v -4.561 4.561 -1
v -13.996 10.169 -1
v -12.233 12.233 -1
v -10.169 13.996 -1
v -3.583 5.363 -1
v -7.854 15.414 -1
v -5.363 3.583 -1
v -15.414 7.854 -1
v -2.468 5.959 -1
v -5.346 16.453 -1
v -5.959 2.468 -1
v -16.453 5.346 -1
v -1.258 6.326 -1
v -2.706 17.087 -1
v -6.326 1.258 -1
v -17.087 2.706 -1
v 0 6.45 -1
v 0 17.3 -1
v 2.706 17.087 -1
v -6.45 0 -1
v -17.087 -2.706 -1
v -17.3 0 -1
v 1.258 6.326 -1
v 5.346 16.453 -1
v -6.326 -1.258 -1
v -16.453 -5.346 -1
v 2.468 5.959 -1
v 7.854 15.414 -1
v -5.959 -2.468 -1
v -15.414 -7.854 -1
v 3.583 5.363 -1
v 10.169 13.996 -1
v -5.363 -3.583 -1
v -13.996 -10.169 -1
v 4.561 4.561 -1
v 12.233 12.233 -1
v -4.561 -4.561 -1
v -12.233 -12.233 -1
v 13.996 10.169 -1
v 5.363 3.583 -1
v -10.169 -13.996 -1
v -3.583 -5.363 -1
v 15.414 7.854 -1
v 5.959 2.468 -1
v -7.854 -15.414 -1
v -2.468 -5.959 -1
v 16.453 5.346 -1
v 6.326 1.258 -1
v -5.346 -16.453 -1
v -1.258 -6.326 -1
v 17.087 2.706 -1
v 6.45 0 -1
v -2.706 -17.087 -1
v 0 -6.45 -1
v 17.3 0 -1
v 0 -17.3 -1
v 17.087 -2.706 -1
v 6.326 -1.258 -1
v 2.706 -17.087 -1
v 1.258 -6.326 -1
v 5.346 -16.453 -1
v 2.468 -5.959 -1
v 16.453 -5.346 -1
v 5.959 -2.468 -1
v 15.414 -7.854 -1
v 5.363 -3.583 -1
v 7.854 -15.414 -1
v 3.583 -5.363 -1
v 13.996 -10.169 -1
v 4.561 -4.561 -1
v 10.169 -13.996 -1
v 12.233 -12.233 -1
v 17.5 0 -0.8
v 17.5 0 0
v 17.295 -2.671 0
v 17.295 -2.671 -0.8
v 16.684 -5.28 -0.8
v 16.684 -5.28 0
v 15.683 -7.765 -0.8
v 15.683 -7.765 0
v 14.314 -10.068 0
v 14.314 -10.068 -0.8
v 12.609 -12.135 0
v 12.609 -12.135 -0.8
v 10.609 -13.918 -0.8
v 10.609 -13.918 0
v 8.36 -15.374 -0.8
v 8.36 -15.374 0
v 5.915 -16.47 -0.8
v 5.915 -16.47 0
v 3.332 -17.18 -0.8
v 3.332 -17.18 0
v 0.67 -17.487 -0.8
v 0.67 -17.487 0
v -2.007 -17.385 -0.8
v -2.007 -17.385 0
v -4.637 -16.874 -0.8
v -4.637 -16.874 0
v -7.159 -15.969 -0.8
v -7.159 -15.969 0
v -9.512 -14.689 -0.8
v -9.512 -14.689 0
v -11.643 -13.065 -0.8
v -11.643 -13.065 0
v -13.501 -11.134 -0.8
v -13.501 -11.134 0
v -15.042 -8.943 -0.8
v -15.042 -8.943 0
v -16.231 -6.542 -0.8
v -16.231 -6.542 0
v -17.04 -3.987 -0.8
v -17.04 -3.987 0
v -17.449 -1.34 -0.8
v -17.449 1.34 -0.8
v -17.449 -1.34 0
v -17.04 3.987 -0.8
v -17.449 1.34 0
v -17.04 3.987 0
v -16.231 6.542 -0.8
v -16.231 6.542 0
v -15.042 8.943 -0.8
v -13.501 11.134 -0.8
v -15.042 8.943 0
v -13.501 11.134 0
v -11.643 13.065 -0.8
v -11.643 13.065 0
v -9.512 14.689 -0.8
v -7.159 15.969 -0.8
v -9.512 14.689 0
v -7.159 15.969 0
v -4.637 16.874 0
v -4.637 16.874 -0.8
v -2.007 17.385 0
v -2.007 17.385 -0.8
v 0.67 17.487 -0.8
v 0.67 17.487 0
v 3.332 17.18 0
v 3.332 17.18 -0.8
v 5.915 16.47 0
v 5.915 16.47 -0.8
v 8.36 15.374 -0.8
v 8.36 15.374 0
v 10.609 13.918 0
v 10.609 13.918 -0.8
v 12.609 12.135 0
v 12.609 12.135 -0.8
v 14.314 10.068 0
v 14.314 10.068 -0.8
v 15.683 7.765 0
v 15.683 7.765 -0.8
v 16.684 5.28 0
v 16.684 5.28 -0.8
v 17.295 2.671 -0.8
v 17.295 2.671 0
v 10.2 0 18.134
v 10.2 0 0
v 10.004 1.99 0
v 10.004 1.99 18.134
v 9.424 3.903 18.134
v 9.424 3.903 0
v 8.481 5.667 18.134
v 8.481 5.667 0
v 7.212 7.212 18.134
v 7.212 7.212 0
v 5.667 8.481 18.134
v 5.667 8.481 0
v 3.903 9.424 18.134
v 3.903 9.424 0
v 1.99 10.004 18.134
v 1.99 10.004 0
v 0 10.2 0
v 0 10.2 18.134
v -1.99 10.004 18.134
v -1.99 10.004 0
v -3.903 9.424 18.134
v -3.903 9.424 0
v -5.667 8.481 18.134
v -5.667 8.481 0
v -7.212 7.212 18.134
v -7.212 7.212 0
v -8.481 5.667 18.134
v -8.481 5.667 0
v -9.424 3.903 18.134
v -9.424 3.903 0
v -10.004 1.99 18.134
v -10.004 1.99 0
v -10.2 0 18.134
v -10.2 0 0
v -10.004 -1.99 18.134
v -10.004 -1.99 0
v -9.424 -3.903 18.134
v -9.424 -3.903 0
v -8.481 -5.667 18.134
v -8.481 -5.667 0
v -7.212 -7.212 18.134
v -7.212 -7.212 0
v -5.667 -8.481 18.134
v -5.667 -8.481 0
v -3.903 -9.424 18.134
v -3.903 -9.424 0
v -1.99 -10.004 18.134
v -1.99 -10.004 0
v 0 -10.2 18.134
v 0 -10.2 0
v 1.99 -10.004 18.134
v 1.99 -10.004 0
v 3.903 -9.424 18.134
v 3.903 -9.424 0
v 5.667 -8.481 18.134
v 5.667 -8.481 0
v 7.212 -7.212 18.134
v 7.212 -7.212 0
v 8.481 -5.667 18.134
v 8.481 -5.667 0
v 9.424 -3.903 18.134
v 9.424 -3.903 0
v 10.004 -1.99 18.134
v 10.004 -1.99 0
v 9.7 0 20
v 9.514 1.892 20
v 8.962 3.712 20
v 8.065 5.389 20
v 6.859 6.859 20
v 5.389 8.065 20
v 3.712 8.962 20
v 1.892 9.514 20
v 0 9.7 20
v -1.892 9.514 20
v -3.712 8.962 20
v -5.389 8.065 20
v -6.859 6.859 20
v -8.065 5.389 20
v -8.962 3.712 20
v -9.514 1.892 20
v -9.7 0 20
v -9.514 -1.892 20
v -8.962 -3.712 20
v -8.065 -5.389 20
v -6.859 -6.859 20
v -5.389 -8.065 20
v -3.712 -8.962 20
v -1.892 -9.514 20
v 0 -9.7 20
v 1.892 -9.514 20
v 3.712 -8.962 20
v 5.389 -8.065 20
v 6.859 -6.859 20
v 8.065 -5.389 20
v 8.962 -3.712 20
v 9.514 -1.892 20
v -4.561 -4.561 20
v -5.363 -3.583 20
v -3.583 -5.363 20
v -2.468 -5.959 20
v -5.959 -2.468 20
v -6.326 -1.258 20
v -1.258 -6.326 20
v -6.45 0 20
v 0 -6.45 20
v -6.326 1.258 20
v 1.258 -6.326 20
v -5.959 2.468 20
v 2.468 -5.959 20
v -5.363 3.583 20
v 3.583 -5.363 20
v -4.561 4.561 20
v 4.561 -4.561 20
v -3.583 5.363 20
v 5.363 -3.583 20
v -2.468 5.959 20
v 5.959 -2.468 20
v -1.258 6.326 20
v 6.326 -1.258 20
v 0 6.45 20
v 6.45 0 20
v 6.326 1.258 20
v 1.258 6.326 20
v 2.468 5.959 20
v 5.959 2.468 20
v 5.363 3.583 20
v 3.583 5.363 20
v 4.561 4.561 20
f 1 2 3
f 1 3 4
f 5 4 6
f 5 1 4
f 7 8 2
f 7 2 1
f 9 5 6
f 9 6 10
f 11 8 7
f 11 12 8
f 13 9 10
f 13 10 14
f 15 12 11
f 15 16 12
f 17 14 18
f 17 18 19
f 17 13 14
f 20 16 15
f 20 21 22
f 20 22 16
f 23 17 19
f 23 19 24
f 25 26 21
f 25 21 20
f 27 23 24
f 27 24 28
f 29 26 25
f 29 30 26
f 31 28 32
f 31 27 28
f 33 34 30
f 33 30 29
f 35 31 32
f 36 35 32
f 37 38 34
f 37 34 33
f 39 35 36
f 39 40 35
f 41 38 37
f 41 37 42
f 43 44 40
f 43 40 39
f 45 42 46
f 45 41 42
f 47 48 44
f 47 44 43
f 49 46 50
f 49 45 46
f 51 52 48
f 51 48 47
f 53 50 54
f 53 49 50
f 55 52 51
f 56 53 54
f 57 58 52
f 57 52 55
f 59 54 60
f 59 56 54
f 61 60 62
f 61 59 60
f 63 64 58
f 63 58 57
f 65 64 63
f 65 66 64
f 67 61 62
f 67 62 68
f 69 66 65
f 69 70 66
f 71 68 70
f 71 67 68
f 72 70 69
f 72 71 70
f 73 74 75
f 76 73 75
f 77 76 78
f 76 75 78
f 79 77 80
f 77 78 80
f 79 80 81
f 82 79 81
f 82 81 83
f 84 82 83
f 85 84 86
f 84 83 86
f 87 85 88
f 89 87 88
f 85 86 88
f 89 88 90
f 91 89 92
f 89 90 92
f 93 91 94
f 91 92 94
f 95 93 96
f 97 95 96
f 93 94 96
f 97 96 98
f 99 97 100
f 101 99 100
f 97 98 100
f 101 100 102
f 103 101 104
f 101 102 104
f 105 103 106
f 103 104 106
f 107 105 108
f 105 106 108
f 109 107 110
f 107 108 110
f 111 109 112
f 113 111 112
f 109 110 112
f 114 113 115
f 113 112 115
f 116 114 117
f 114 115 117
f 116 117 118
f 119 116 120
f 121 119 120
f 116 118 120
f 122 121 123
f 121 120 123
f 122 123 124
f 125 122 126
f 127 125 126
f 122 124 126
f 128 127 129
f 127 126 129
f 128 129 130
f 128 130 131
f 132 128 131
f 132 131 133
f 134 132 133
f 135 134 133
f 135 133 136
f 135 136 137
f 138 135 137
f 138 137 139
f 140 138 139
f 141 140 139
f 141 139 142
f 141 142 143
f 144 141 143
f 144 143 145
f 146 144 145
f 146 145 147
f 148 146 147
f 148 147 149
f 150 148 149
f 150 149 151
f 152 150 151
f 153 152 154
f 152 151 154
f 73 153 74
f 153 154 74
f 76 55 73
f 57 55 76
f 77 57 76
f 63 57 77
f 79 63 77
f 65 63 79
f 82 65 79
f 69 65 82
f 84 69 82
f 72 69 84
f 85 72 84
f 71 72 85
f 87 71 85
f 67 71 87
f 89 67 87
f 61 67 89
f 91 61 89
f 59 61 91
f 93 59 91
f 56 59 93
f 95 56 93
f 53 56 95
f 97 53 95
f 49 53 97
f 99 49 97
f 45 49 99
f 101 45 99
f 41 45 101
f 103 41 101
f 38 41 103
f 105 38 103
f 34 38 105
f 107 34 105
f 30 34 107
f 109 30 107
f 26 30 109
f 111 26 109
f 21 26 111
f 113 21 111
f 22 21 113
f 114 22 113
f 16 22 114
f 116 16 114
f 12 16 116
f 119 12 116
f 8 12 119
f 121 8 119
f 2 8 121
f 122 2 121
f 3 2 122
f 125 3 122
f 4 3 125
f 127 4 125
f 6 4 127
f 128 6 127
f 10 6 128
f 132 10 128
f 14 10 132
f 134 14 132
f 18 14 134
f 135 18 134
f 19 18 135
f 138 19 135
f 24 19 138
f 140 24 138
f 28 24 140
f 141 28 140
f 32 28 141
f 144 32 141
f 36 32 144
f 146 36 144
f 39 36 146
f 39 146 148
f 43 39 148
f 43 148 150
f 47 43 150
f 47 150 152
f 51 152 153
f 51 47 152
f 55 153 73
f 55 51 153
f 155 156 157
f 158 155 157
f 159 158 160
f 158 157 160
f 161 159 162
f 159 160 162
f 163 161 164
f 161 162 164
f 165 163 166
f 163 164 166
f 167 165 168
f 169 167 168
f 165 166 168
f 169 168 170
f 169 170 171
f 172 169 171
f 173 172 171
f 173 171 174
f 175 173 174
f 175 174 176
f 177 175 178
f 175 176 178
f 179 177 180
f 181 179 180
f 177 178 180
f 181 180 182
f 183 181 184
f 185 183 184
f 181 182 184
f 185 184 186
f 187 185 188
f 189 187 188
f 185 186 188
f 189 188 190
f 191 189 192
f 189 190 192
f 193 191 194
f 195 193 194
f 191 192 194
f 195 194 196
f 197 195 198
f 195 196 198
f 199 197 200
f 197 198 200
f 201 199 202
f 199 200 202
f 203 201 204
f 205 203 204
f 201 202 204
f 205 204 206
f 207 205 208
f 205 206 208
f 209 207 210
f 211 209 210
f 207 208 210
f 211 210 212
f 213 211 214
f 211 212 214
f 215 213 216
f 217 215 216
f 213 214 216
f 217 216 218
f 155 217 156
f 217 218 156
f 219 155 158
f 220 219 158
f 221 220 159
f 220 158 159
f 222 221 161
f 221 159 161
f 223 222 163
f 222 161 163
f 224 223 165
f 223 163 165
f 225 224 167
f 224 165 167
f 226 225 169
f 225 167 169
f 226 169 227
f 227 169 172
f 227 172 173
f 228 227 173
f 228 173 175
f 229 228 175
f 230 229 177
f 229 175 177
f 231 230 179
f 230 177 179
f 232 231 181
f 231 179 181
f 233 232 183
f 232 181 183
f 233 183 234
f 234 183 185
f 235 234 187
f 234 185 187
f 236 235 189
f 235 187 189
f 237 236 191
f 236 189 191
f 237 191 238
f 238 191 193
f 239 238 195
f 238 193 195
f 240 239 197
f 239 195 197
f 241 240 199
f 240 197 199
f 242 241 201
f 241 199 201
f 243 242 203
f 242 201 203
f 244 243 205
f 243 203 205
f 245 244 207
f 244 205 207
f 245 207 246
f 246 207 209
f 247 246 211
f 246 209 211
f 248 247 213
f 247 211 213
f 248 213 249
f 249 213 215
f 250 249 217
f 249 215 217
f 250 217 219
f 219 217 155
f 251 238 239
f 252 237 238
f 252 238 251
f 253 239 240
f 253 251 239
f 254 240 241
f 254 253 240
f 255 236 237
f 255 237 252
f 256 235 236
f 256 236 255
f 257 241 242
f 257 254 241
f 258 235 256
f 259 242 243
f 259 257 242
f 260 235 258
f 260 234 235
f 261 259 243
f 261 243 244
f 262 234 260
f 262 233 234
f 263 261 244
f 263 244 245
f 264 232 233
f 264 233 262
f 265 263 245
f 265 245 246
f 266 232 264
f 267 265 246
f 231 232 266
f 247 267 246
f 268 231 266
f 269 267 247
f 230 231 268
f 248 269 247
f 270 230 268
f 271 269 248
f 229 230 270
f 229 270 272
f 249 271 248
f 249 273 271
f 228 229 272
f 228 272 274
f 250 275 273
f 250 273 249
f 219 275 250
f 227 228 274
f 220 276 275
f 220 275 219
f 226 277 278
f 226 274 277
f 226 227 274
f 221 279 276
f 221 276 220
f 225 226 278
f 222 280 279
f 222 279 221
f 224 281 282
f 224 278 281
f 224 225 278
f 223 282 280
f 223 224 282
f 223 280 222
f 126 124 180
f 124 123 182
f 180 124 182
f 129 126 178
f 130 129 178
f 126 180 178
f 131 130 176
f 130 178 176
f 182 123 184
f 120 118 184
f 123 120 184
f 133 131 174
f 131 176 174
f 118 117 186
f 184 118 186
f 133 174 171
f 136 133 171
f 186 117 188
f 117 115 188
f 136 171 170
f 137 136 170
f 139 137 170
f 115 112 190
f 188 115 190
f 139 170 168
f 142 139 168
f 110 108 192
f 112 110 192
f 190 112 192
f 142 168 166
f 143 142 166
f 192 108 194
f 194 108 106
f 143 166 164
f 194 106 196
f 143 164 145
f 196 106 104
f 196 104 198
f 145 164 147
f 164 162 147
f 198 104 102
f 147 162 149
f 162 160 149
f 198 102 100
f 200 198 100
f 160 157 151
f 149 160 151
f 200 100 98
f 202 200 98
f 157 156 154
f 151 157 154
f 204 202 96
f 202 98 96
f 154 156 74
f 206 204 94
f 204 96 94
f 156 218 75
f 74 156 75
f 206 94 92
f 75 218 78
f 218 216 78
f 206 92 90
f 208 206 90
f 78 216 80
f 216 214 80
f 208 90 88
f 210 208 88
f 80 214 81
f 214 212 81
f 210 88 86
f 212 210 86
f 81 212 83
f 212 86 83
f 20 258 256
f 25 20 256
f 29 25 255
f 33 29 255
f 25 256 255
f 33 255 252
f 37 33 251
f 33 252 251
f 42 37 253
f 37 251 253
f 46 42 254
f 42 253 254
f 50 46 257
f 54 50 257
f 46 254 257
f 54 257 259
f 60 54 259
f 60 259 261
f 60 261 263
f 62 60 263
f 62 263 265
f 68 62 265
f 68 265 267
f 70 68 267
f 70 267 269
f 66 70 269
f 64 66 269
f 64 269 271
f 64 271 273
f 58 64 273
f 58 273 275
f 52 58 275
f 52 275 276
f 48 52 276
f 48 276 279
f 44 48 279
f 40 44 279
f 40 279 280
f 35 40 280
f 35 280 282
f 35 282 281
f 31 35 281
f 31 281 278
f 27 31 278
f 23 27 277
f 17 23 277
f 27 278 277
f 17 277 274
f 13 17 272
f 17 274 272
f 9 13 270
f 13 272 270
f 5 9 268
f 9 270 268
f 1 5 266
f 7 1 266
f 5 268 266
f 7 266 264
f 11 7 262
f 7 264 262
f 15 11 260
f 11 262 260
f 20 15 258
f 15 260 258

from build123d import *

# Parameters (mm, degrees)
F1_R     = 10.2
F2_DEPTH = 20
F3_R     = 17.5
F4_DEPTH = 1
F6_D     = 12.9
F7_SIZE2 = 0.2
F7_SIZE  = 0.2
F8_SIZE2 = 1.8660254038
F8_SIZE  = 0.5


with BuildPart() as f2:
    # F1 (on Top) → F2 (new body)
    with BuildSketch(Plane.XY):
        Circle(F1_R)
    extrude(amount=F2_DEPTH)

    # F3 (on face) → F4 (join)
    with BuildSketch(Plane(origin=(0, 0, 0), x_dir=(1, 0, 0), z_dir=(0, 0, -1))):
        Circle(F3_R)
    extrude(amount=F4_DEPTH)

    # F6 (through all)
    with Locations(Plane(origin=(0, 0, -1), x_dir=(1, 0, 0), z_dir=(0, 0, -1))):
        with Locations((0, 0)):
            Hole(F6_D / 2)

    # F7
    f7_edges = [f2.edges().sort_by_distance(p)[0] for p in [
        (-17.5, 0, -1),
    ]]
    chamfer(f7_edges, length=F7_SIZE, length2=F7_SIZE2)

    # F8
    f8_edges = [f2.edges().sort_by_distance(p)[0] for p in [
        (-10.2, 0, 20),
    ]]
    f8_side = f2.faces().sort_by_distance((-9.9115, 0, 20))[0]
    chamfer(f8_edges, length=F8_SIZE, length2=F8_SIZE2, reference=f8_side)


solid = f2.part
